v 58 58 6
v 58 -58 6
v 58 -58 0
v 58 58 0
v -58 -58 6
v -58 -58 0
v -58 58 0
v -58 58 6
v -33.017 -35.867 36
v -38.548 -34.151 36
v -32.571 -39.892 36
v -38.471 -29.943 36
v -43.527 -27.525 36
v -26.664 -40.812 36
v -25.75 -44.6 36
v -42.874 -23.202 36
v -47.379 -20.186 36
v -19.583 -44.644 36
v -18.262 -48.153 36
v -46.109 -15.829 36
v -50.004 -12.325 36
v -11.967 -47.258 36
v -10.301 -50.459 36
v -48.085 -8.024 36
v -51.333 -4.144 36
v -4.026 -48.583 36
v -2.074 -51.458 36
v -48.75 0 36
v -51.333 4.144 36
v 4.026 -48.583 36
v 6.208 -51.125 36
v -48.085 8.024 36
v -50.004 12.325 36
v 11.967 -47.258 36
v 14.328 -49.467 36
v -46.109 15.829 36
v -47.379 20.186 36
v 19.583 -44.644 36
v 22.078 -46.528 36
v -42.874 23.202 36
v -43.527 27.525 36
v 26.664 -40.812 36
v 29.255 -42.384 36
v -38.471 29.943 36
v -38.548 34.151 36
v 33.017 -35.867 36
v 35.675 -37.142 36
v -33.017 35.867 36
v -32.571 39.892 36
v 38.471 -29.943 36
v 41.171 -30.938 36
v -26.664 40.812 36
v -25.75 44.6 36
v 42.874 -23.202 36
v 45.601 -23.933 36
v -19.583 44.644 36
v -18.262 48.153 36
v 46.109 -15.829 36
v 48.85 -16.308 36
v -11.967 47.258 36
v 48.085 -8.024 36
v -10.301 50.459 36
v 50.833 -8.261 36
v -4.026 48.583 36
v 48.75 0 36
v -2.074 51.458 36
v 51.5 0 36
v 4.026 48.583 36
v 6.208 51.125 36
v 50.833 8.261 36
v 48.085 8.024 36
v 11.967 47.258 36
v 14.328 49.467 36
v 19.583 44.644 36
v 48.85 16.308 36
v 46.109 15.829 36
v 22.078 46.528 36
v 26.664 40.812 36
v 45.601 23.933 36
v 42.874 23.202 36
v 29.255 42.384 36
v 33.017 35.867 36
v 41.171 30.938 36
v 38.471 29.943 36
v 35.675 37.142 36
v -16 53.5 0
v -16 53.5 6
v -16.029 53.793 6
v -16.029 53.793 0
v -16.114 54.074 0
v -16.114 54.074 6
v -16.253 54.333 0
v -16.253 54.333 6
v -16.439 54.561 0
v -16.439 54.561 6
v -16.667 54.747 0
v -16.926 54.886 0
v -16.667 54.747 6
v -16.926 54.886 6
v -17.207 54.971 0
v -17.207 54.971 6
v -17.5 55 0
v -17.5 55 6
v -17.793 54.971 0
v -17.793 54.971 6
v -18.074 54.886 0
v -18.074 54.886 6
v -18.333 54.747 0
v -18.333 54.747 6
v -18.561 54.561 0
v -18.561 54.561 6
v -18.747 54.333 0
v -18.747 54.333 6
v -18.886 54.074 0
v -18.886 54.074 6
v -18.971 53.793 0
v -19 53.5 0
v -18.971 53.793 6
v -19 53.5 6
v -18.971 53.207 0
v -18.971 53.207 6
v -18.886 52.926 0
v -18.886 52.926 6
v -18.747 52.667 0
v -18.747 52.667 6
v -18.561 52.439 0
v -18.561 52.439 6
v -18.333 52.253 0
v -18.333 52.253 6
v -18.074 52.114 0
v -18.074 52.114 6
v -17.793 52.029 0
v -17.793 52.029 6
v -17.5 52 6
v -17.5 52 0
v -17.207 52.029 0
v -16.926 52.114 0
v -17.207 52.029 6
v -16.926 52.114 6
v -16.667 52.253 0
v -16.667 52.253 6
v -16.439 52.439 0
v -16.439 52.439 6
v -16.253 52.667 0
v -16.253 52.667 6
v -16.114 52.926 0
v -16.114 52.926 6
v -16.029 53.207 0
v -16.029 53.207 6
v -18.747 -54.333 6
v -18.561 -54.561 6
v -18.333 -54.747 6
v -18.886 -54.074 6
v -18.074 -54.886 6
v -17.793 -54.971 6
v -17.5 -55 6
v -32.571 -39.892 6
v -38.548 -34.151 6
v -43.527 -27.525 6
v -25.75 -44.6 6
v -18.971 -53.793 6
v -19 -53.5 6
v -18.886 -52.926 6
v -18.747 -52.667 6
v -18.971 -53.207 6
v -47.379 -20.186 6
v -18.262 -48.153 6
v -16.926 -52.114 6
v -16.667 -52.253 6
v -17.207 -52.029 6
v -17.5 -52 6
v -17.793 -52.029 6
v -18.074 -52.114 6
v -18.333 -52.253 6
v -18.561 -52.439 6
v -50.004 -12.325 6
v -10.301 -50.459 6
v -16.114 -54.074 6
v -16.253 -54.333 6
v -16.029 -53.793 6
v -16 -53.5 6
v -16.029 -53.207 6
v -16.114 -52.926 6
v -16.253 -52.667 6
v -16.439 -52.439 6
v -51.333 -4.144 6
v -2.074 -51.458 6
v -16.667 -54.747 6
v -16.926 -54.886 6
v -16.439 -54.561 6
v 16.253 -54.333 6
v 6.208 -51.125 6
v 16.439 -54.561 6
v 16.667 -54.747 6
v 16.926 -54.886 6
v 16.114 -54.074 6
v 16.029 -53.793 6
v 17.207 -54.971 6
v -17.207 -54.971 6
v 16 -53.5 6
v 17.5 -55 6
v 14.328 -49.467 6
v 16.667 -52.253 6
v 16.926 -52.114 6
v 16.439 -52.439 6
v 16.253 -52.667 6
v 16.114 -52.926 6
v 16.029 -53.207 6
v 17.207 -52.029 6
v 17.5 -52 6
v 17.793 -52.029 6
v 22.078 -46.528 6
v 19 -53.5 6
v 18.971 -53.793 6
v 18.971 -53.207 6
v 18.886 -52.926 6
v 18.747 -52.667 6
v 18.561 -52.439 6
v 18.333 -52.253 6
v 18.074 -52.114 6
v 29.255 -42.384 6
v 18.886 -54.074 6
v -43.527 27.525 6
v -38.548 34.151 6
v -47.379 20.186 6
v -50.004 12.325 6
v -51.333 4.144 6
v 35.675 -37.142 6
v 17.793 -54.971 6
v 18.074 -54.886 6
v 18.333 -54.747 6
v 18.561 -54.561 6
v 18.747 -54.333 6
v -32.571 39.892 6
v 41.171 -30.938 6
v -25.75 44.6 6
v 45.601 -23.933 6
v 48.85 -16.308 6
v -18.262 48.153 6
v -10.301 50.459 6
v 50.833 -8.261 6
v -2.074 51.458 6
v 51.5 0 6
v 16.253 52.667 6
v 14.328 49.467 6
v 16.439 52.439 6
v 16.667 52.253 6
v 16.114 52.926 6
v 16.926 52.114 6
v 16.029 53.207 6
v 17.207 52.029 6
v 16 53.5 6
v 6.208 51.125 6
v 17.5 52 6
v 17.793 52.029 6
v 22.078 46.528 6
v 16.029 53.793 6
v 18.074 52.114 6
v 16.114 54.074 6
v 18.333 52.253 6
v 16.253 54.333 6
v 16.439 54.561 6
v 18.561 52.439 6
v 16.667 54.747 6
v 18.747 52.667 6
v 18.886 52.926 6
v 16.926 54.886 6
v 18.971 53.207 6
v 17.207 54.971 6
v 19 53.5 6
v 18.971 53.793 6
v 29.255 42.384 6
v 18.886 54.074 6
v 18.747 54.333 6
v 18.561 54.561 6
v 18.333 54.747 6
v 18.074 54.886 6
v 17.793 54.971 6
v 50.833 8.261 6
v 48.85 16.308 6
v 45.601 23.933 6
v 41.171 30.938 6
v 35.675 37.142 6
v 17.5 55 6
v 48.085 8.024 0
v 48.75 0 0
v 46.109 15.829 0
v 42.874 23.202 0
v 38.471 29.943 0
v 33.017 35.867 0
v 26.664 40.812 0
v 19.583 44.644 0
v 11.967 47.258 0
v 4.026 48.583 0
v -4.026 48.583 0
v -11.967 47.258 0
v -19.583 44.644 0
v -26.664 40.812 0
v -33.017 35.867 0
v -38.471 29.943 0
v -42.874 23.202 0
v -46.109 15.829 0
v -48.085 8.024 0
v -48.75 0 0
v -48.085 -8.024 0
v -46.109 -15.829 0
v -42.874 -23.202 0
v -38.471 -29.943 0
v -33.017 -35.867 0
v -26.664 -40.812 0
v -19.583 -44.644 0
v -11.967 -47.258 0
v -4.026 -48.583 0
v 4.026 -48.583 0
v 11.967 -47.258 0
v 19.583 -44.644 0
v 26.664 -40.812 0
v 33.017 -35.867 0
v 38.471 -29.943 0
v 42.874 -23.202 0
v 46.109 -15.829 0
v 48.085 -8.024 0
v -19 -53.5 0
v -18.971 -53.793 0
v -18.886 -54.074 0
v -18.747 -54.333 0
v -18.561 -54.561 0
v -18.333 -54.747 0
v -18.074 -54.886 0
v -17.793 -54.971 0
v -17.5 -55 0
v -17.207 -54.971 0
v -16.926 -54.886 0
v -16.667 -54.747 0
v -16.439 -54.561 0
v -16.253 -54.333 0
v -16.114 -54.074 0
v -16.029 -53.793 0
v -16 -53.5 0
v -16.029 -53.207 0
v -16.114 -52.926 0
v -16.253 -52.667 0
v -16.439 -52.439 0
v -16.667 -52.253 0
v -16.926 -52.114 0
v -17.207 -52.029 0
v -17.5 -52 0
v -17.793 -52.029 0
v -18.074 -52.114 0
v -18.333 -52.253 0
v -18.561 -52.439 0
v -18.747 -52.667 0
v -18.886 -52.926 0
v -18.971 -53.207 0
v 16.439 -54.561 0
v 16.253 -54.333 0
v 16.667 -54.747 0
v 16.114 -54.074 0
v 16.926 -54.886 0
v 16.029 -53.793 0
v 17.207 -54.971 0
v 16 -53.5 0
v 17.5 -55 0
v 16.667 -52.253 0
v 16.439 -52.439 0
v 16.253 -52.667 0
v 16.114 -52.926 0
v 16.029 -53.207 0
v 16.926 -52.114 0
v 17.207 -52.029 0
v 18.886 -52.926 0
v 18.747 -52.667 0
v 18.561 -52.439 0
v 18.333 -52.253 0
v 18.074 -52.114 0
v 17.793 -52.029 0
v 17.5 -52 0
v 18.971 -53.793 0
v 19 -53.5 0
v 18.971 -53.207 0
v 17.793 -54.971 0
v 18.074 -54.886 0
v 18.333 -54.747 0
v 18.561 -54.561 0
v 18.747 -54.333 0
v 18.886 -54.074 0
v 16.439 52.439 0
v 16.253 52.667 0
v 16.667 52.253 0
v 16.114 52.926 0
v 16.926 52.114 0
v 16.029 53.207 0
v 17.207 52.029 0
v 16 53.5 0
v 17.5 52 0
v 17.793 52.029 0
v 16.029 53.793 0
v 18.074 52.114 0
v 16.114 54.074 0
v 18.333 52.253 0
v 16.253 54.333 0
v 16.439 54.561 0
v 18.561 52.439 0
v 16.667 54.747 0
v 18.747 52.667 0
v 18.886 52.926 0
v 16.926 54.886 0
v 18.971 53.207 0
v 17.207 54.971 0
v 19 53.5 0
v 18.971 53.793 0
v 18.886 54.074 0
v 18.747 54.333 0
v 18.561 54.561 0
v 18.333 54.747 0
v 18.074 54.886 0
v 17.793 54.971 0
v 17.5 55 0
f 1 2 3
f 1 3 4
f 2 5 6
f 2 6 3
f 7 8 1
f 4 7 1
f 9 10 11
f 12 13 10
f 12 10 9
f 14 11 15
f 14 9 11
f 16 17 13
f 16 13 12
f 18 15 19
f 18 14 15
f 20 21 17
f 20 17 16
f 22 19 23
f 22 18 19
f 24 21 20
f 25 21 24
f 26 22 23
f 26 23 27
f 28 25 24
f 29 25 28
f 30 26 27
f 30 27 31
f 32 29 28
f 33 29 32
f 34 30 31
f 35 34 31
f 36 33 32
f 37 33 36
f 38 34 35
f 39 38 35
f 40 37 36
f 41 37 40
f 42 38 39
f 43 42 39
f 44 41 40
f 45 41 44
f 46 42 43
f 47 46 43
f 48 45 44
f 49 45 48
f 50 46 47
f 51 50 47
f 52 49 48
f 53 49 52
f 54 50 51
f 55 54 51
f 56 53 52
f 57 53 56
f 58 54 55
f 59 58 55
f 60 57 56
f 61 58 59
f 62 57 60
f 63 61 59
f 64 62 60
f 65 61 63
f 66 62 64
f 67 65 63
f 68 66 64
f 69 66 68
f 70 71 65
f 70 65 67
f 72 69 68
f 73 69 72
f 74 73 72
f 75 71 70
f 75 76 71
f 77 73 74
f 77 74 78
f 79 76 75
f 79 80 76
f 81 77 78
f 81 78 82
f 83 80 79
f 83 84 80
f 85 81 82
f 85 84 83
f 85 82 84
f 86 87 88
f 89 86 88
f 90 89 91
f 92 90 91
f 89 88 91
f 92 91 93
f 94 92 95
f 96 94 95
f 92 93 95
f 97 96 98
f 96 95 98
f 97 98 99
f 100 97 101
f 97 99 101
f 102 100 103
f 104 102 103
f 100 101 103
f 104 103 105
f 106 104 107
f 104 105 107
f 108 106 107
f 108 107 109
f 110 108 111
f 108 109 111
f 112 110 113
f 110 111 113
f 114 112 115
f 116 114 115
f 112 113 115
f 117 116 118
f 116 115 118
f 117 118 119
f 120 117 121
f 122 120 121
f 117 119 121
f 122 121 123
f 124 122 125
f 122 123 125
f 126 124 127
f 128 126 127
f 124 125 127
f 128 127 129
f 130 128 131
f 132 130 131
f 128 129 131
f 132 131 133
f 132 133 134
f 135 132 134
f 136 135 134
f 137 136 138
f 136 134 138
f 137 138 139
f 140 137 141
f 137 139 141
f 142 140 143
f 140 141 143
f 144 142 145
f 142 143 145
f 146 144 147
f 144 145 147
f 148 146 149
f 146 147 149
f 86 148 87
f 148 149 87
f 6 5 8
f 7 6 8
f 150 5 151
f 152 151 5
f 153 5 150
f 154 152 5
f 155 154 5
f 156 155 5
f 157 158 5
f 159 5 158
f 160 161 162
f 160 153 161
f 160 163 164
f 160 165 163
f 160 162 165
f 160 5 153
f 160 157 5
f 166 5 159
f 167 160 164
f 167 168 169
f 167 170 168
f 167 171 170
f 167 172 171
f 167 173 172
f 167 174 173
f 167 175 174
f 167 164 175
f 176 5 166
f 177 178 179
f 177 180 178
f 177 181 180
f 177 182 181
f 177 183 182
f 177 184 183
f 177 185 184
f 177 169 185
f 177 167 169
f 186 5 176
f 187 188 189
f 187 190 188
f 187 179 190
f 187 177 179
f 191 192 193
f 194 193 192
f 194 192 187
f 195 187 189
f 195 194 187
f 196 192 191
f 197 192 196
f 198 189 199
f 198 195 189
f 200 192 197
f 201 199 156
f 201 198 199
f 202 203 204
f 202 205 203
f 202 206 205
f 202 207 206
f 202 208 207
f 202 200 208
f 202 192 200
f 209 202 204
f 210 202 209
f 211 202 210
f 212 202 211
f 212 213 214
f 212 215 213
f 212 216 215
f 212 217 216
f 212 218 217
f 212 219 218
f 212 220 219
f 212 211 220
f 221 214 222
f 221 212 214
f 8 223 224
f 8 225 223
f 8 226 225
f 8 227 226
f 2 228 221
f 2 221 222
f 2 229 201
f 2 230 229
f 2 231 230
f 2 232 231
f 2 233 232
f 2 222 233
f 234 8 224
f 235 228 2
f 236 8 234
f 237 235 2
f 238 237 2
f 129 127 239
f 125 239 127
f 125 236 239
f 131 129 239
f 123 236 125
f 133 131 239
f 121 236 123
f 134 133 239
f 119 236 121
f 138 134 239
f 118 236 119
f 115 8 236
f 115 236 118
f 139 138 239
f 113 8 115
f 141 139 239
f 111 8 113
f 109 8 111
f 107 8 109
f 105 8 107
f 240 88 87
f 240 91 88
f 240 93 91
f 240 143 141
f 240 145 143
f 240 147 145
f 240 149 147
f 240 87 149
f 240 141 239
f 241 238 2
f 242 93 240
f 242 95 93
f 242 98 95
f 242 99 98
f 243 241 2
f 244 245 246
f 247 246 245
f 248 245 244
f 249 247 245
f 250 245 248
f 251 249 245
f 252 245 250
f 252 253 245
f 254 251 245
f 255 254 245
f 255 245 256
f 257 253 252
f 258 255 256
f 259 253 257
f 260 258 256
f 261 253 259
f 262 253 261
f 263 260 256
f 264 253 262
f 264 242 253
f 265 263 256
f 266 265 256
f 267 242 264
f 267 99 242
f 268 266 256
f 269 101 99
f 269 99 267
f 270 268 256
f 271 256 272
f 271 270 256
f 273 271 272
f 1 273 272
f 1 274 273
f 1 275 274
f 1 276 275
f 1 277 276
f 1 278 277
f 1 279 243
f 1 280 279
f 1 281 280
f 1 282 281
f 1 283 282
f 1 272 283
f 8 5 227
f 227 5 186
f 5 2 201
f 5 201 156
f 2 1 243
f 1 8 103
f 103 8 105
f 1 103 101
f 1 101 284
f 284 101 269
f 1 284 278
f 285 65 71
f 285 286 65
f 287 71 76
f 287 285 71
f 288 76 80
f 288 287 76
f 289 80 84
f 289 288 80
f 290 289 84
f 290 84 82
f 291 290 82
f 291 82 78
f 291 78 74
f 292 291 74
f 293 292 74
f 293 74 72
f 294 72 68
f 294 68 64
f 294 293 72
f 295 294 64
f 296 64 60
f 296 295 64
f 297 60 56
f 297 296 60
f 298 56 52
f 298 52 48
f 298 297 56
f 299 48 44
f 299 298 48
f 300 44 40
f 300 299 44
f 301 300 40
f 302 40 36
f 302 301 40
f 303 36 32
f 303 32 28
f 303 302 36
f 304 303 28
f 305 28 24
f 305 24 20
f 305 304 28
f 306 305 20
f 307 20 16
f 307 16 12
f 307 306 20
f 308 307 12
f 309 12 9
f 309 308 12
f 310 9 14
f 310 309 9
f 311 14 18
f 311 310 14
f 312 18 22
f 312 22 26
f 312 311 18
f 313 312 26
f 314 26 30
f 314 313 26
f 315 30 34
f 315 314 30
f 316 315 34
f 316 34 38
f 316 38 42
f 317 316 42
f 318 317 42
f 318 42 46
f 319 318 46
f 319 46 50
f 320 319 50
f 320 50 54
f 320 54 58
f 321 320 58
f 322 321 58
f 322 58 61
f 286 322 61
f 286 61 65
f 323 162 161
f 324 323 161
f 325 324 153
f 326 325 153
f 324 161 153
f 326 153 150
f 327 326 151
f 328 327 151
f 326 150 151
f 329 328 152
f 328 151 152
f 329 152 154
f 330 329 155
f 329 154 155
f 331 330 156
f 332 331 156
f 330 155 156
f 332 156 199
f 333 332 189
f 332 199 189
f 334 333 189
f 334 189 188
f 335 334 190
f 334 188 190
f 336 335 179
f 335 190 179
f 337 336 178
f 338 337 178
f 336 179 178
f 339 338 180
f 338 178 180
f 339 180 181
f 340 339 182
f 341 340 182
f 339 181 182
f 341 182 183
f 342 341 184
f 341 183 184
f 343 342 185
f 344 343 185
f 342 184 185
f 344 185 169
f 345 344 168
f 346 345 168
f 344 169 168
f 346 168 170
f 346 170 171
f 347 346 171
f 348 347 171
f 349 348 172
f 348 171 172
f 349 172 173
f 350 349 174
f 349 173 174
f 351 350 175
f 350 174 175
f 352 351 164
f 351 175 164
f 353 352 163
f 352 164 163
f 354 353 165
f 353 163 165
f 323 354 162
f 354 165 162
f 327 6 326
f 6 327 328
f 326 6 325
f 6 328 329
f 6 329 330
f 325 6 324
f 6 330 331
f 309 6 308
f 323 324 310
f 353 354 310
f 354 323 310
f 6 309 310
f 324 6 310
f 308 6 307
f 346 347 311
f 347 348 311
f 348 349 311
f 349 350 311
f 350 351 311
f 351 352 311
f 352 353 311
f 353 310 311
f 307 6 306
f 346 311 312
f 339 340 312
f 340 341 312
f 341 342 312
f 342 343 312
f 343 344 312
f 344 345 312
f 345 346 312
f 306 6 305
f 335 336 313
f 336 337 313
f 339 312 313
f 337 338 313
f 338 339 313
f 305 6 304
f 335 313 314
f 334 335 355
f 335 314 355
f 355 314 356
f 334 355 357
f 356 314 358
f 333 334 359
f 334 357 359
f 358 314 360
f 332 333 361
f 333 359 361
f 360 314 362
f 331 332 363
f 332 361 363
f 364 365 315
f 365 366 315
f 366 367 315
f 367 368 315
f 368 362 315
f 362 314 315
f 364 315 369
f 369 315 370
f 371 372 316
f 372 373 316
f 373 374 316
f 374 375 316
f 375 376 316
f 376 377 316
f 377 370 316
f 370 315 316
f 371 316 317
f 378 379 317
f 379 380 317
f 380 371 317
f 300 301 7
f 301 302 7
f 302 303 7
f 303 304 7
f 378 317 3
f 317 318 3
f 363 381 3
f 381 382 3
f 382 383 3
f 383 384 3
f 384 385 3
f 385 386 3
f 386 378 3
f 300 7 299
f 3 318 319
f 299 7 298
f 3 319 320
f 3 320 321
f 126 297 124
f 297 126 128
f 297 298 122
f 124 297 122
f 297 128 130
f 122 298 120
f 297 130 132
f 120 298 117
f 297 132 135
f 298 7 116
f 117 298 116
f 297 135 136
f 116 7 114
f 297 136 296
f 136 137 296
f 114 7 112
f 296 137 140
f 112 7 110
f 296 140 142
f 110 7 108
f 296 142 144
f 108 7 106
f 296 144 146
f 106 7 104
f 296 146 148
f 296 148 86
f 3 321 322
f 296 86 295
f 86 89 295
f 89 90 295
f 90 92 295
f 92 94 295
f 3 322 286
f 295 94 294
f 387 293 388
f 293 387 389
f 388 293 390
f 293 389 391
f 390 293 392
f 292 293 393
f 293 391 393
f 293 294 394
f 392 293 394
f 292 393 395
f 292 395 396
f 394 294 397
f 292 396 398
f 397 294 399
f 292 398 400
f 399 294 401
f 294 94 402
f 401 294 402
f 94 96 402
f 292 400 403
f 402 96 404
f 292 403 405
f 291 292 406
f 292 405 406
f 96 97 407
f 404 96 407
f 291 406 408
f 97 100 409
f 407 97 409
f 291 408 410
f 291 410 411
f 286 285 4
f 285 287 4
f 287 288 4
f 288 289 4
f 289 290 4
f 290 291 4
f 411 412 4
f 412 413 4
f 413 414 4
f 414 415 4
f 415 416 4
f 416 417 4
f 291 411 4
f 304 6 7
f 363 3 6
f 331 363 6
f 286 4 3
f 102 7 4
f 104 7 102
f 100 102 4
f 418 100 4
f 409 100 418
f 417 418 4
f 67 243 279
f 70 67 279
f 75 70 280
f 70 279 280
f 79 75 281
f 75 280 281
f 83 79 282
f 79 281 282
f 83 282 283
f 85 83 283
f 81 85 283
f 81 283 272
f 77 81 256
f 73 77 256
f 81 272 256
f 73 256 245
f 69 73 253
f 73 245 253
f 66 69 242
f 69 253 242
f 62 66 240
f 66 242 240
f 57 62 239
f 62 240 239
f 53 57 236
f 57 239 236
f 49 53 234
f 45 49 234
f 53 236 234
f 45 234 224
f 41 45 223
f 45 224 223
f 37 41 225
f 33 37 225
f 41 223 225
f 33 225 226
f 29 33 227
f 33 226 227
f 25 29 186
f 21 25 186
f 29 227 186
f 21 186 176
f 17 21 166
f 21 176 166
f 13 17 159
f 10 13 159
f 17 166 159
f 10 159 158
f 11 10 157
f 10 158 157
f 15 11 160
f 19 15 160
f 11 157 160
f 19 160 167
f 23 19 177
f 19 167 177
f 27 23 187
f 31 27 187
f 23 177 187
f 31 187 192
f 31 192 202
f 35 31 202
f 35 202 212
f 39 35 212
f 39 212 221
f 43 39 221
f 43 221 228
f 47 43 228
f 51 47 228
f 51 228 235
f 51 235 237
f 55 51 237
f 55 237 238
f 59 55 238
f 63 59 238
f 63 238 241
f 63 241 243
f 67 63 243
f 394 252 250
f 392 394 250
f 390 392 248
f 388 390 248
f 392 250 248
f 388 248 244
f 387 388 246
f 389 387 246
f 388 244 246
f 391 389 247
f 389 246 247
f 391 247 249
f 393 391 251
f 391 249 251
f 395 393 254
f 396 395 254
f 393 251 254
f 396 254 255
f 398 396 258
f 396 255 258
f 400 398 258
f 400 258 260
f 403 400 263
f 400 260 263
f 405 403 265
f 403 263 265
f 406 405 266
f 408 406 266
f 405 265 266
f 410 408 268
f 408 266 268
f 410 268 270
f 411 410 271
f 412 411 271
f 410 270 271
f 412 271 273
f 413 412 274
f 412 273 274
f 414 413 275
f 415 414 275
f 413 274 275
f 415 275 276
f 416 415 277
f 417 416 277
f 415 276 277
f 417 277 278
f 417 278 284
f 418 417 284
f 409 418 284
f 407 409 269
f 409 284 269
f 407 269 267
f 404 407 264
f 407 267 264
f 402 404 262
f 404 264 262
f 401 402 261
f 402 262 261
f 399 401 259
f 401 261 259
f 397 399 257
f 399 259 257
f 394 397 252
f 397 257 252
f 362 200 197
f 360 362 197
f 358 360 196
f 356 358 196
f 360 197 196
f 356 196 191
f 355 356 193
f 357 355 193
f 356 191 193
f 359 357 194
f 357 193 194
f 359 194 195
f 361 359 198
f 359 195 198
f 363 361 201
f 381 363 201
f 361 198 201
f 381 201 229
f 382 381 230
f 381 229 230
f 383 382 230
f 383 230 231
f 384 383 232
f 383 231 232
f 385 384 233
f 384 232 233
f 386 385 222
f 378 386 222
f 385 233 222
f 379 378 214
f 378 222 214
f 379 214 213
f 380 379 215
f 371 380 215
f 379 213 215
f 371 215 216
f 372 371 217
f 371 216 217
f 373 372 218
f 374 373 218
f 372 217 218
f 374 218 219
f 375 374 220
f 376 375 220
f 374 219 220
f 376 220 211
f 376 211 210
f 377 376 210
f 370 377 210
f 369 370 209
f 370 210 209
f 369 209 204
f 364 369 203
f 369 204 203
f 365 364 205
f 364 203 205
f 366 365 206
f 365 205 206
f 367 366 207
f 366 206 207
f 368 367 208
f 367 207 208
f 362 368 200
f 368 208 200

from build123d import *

# Parameters (mm, degrees)
F1_W     = 116
F1_H     = 116
F1_R     = 51.5
F1_R_2   = 48.75
F2_DEPTH = 6
F3_DEPTH = 30
F4_DEPTH = 6
F5_DEPTH = 6


with BuildPart() as f2:
    # F1 (on Top) → F2 (new body)
    with BuildSketch(Plane.XY):
        Rectangle(F1_W, F1_H)
        Circle(F1_R, mode=Mode.SUBTRACT)
        Circle(F1_R)
        Circle(F1_R_2, mode=Mode.SUBTRACT)
    extrude(amount=-F2_DEPTH)

    # F1 (on Top) → F3 (join)
    with BuildSketch(Plane.XY):
        Circle(F1_R)
        Circle(F1_R_2, mode=Mode.SUBTRACT)
    extrude(amount=F3_DEPTH)

    # F0 (on Top) → F4 (cut)
    with BuildSketch(Plane.XY):
        with BuildLine():
            Line((16, 53.5), (19, 53.5))
            ThreePointArc((19, 53.5), (17.5, 55), (16, 53.5))
        make_face()
        with BuildLine():
            ThreePointArc((16, 53.5), (17.5, 52), (19, 53.5))
            Line((19, 53.5), (16, 53.5))
        make_face()
    extrude(amount=-F4_DEPTH, mode=Mode.SUBTRACT)

    # F0 (on Top) → F5 (cut)
    with BuildSketch(Plane.XY):
        with BuildLine():
            Line((16, -53.5), (19, -53.5))
            ThreePointArc((19, -53.5), (17.5, -52), (16, -53.5))
        make_face()
        with BuildLine():
            ThreePointArc((16, -53.5), (17.5, -55), (19, -53.5))
            Line((19, -53.5), (16, -53.5))
        make_face()
        with BuildLine():
            Line((-19, -53.5), (-16, -53.5))
            ThreePointArc((-16, -53.5), (-17.5, -52), (-19, -53.5))
        make_face()
        with BuildLine():
            ThreePointArc((-19, -53.5), (-17.5, -55), (-16, -53.5))
            Line((-16, -53.5), (-19, -53.5))
        make_face()
        with BuildLine():
            ThreePointArc((-19, 53.5), (-17.5, 52), (-16, 53.5))
            Line((-16, 53.5), (-19, 53.5))
        make_face()
        with BuildLine():
            Line((-19, 53.5), (-16, 53.5))
            ThreePointArc((-16, 53.5), (-17.5, 55), (-19, 53.5))
        make_face()
    extrude(amount=-F5_DEPTH, mode=Mode.SUBTRACT)


with BuildPart() as f2_1:
    # F6: moved
    add(f2.part.moved(Location((0, 0, 6))))


solid = f2_1.part
